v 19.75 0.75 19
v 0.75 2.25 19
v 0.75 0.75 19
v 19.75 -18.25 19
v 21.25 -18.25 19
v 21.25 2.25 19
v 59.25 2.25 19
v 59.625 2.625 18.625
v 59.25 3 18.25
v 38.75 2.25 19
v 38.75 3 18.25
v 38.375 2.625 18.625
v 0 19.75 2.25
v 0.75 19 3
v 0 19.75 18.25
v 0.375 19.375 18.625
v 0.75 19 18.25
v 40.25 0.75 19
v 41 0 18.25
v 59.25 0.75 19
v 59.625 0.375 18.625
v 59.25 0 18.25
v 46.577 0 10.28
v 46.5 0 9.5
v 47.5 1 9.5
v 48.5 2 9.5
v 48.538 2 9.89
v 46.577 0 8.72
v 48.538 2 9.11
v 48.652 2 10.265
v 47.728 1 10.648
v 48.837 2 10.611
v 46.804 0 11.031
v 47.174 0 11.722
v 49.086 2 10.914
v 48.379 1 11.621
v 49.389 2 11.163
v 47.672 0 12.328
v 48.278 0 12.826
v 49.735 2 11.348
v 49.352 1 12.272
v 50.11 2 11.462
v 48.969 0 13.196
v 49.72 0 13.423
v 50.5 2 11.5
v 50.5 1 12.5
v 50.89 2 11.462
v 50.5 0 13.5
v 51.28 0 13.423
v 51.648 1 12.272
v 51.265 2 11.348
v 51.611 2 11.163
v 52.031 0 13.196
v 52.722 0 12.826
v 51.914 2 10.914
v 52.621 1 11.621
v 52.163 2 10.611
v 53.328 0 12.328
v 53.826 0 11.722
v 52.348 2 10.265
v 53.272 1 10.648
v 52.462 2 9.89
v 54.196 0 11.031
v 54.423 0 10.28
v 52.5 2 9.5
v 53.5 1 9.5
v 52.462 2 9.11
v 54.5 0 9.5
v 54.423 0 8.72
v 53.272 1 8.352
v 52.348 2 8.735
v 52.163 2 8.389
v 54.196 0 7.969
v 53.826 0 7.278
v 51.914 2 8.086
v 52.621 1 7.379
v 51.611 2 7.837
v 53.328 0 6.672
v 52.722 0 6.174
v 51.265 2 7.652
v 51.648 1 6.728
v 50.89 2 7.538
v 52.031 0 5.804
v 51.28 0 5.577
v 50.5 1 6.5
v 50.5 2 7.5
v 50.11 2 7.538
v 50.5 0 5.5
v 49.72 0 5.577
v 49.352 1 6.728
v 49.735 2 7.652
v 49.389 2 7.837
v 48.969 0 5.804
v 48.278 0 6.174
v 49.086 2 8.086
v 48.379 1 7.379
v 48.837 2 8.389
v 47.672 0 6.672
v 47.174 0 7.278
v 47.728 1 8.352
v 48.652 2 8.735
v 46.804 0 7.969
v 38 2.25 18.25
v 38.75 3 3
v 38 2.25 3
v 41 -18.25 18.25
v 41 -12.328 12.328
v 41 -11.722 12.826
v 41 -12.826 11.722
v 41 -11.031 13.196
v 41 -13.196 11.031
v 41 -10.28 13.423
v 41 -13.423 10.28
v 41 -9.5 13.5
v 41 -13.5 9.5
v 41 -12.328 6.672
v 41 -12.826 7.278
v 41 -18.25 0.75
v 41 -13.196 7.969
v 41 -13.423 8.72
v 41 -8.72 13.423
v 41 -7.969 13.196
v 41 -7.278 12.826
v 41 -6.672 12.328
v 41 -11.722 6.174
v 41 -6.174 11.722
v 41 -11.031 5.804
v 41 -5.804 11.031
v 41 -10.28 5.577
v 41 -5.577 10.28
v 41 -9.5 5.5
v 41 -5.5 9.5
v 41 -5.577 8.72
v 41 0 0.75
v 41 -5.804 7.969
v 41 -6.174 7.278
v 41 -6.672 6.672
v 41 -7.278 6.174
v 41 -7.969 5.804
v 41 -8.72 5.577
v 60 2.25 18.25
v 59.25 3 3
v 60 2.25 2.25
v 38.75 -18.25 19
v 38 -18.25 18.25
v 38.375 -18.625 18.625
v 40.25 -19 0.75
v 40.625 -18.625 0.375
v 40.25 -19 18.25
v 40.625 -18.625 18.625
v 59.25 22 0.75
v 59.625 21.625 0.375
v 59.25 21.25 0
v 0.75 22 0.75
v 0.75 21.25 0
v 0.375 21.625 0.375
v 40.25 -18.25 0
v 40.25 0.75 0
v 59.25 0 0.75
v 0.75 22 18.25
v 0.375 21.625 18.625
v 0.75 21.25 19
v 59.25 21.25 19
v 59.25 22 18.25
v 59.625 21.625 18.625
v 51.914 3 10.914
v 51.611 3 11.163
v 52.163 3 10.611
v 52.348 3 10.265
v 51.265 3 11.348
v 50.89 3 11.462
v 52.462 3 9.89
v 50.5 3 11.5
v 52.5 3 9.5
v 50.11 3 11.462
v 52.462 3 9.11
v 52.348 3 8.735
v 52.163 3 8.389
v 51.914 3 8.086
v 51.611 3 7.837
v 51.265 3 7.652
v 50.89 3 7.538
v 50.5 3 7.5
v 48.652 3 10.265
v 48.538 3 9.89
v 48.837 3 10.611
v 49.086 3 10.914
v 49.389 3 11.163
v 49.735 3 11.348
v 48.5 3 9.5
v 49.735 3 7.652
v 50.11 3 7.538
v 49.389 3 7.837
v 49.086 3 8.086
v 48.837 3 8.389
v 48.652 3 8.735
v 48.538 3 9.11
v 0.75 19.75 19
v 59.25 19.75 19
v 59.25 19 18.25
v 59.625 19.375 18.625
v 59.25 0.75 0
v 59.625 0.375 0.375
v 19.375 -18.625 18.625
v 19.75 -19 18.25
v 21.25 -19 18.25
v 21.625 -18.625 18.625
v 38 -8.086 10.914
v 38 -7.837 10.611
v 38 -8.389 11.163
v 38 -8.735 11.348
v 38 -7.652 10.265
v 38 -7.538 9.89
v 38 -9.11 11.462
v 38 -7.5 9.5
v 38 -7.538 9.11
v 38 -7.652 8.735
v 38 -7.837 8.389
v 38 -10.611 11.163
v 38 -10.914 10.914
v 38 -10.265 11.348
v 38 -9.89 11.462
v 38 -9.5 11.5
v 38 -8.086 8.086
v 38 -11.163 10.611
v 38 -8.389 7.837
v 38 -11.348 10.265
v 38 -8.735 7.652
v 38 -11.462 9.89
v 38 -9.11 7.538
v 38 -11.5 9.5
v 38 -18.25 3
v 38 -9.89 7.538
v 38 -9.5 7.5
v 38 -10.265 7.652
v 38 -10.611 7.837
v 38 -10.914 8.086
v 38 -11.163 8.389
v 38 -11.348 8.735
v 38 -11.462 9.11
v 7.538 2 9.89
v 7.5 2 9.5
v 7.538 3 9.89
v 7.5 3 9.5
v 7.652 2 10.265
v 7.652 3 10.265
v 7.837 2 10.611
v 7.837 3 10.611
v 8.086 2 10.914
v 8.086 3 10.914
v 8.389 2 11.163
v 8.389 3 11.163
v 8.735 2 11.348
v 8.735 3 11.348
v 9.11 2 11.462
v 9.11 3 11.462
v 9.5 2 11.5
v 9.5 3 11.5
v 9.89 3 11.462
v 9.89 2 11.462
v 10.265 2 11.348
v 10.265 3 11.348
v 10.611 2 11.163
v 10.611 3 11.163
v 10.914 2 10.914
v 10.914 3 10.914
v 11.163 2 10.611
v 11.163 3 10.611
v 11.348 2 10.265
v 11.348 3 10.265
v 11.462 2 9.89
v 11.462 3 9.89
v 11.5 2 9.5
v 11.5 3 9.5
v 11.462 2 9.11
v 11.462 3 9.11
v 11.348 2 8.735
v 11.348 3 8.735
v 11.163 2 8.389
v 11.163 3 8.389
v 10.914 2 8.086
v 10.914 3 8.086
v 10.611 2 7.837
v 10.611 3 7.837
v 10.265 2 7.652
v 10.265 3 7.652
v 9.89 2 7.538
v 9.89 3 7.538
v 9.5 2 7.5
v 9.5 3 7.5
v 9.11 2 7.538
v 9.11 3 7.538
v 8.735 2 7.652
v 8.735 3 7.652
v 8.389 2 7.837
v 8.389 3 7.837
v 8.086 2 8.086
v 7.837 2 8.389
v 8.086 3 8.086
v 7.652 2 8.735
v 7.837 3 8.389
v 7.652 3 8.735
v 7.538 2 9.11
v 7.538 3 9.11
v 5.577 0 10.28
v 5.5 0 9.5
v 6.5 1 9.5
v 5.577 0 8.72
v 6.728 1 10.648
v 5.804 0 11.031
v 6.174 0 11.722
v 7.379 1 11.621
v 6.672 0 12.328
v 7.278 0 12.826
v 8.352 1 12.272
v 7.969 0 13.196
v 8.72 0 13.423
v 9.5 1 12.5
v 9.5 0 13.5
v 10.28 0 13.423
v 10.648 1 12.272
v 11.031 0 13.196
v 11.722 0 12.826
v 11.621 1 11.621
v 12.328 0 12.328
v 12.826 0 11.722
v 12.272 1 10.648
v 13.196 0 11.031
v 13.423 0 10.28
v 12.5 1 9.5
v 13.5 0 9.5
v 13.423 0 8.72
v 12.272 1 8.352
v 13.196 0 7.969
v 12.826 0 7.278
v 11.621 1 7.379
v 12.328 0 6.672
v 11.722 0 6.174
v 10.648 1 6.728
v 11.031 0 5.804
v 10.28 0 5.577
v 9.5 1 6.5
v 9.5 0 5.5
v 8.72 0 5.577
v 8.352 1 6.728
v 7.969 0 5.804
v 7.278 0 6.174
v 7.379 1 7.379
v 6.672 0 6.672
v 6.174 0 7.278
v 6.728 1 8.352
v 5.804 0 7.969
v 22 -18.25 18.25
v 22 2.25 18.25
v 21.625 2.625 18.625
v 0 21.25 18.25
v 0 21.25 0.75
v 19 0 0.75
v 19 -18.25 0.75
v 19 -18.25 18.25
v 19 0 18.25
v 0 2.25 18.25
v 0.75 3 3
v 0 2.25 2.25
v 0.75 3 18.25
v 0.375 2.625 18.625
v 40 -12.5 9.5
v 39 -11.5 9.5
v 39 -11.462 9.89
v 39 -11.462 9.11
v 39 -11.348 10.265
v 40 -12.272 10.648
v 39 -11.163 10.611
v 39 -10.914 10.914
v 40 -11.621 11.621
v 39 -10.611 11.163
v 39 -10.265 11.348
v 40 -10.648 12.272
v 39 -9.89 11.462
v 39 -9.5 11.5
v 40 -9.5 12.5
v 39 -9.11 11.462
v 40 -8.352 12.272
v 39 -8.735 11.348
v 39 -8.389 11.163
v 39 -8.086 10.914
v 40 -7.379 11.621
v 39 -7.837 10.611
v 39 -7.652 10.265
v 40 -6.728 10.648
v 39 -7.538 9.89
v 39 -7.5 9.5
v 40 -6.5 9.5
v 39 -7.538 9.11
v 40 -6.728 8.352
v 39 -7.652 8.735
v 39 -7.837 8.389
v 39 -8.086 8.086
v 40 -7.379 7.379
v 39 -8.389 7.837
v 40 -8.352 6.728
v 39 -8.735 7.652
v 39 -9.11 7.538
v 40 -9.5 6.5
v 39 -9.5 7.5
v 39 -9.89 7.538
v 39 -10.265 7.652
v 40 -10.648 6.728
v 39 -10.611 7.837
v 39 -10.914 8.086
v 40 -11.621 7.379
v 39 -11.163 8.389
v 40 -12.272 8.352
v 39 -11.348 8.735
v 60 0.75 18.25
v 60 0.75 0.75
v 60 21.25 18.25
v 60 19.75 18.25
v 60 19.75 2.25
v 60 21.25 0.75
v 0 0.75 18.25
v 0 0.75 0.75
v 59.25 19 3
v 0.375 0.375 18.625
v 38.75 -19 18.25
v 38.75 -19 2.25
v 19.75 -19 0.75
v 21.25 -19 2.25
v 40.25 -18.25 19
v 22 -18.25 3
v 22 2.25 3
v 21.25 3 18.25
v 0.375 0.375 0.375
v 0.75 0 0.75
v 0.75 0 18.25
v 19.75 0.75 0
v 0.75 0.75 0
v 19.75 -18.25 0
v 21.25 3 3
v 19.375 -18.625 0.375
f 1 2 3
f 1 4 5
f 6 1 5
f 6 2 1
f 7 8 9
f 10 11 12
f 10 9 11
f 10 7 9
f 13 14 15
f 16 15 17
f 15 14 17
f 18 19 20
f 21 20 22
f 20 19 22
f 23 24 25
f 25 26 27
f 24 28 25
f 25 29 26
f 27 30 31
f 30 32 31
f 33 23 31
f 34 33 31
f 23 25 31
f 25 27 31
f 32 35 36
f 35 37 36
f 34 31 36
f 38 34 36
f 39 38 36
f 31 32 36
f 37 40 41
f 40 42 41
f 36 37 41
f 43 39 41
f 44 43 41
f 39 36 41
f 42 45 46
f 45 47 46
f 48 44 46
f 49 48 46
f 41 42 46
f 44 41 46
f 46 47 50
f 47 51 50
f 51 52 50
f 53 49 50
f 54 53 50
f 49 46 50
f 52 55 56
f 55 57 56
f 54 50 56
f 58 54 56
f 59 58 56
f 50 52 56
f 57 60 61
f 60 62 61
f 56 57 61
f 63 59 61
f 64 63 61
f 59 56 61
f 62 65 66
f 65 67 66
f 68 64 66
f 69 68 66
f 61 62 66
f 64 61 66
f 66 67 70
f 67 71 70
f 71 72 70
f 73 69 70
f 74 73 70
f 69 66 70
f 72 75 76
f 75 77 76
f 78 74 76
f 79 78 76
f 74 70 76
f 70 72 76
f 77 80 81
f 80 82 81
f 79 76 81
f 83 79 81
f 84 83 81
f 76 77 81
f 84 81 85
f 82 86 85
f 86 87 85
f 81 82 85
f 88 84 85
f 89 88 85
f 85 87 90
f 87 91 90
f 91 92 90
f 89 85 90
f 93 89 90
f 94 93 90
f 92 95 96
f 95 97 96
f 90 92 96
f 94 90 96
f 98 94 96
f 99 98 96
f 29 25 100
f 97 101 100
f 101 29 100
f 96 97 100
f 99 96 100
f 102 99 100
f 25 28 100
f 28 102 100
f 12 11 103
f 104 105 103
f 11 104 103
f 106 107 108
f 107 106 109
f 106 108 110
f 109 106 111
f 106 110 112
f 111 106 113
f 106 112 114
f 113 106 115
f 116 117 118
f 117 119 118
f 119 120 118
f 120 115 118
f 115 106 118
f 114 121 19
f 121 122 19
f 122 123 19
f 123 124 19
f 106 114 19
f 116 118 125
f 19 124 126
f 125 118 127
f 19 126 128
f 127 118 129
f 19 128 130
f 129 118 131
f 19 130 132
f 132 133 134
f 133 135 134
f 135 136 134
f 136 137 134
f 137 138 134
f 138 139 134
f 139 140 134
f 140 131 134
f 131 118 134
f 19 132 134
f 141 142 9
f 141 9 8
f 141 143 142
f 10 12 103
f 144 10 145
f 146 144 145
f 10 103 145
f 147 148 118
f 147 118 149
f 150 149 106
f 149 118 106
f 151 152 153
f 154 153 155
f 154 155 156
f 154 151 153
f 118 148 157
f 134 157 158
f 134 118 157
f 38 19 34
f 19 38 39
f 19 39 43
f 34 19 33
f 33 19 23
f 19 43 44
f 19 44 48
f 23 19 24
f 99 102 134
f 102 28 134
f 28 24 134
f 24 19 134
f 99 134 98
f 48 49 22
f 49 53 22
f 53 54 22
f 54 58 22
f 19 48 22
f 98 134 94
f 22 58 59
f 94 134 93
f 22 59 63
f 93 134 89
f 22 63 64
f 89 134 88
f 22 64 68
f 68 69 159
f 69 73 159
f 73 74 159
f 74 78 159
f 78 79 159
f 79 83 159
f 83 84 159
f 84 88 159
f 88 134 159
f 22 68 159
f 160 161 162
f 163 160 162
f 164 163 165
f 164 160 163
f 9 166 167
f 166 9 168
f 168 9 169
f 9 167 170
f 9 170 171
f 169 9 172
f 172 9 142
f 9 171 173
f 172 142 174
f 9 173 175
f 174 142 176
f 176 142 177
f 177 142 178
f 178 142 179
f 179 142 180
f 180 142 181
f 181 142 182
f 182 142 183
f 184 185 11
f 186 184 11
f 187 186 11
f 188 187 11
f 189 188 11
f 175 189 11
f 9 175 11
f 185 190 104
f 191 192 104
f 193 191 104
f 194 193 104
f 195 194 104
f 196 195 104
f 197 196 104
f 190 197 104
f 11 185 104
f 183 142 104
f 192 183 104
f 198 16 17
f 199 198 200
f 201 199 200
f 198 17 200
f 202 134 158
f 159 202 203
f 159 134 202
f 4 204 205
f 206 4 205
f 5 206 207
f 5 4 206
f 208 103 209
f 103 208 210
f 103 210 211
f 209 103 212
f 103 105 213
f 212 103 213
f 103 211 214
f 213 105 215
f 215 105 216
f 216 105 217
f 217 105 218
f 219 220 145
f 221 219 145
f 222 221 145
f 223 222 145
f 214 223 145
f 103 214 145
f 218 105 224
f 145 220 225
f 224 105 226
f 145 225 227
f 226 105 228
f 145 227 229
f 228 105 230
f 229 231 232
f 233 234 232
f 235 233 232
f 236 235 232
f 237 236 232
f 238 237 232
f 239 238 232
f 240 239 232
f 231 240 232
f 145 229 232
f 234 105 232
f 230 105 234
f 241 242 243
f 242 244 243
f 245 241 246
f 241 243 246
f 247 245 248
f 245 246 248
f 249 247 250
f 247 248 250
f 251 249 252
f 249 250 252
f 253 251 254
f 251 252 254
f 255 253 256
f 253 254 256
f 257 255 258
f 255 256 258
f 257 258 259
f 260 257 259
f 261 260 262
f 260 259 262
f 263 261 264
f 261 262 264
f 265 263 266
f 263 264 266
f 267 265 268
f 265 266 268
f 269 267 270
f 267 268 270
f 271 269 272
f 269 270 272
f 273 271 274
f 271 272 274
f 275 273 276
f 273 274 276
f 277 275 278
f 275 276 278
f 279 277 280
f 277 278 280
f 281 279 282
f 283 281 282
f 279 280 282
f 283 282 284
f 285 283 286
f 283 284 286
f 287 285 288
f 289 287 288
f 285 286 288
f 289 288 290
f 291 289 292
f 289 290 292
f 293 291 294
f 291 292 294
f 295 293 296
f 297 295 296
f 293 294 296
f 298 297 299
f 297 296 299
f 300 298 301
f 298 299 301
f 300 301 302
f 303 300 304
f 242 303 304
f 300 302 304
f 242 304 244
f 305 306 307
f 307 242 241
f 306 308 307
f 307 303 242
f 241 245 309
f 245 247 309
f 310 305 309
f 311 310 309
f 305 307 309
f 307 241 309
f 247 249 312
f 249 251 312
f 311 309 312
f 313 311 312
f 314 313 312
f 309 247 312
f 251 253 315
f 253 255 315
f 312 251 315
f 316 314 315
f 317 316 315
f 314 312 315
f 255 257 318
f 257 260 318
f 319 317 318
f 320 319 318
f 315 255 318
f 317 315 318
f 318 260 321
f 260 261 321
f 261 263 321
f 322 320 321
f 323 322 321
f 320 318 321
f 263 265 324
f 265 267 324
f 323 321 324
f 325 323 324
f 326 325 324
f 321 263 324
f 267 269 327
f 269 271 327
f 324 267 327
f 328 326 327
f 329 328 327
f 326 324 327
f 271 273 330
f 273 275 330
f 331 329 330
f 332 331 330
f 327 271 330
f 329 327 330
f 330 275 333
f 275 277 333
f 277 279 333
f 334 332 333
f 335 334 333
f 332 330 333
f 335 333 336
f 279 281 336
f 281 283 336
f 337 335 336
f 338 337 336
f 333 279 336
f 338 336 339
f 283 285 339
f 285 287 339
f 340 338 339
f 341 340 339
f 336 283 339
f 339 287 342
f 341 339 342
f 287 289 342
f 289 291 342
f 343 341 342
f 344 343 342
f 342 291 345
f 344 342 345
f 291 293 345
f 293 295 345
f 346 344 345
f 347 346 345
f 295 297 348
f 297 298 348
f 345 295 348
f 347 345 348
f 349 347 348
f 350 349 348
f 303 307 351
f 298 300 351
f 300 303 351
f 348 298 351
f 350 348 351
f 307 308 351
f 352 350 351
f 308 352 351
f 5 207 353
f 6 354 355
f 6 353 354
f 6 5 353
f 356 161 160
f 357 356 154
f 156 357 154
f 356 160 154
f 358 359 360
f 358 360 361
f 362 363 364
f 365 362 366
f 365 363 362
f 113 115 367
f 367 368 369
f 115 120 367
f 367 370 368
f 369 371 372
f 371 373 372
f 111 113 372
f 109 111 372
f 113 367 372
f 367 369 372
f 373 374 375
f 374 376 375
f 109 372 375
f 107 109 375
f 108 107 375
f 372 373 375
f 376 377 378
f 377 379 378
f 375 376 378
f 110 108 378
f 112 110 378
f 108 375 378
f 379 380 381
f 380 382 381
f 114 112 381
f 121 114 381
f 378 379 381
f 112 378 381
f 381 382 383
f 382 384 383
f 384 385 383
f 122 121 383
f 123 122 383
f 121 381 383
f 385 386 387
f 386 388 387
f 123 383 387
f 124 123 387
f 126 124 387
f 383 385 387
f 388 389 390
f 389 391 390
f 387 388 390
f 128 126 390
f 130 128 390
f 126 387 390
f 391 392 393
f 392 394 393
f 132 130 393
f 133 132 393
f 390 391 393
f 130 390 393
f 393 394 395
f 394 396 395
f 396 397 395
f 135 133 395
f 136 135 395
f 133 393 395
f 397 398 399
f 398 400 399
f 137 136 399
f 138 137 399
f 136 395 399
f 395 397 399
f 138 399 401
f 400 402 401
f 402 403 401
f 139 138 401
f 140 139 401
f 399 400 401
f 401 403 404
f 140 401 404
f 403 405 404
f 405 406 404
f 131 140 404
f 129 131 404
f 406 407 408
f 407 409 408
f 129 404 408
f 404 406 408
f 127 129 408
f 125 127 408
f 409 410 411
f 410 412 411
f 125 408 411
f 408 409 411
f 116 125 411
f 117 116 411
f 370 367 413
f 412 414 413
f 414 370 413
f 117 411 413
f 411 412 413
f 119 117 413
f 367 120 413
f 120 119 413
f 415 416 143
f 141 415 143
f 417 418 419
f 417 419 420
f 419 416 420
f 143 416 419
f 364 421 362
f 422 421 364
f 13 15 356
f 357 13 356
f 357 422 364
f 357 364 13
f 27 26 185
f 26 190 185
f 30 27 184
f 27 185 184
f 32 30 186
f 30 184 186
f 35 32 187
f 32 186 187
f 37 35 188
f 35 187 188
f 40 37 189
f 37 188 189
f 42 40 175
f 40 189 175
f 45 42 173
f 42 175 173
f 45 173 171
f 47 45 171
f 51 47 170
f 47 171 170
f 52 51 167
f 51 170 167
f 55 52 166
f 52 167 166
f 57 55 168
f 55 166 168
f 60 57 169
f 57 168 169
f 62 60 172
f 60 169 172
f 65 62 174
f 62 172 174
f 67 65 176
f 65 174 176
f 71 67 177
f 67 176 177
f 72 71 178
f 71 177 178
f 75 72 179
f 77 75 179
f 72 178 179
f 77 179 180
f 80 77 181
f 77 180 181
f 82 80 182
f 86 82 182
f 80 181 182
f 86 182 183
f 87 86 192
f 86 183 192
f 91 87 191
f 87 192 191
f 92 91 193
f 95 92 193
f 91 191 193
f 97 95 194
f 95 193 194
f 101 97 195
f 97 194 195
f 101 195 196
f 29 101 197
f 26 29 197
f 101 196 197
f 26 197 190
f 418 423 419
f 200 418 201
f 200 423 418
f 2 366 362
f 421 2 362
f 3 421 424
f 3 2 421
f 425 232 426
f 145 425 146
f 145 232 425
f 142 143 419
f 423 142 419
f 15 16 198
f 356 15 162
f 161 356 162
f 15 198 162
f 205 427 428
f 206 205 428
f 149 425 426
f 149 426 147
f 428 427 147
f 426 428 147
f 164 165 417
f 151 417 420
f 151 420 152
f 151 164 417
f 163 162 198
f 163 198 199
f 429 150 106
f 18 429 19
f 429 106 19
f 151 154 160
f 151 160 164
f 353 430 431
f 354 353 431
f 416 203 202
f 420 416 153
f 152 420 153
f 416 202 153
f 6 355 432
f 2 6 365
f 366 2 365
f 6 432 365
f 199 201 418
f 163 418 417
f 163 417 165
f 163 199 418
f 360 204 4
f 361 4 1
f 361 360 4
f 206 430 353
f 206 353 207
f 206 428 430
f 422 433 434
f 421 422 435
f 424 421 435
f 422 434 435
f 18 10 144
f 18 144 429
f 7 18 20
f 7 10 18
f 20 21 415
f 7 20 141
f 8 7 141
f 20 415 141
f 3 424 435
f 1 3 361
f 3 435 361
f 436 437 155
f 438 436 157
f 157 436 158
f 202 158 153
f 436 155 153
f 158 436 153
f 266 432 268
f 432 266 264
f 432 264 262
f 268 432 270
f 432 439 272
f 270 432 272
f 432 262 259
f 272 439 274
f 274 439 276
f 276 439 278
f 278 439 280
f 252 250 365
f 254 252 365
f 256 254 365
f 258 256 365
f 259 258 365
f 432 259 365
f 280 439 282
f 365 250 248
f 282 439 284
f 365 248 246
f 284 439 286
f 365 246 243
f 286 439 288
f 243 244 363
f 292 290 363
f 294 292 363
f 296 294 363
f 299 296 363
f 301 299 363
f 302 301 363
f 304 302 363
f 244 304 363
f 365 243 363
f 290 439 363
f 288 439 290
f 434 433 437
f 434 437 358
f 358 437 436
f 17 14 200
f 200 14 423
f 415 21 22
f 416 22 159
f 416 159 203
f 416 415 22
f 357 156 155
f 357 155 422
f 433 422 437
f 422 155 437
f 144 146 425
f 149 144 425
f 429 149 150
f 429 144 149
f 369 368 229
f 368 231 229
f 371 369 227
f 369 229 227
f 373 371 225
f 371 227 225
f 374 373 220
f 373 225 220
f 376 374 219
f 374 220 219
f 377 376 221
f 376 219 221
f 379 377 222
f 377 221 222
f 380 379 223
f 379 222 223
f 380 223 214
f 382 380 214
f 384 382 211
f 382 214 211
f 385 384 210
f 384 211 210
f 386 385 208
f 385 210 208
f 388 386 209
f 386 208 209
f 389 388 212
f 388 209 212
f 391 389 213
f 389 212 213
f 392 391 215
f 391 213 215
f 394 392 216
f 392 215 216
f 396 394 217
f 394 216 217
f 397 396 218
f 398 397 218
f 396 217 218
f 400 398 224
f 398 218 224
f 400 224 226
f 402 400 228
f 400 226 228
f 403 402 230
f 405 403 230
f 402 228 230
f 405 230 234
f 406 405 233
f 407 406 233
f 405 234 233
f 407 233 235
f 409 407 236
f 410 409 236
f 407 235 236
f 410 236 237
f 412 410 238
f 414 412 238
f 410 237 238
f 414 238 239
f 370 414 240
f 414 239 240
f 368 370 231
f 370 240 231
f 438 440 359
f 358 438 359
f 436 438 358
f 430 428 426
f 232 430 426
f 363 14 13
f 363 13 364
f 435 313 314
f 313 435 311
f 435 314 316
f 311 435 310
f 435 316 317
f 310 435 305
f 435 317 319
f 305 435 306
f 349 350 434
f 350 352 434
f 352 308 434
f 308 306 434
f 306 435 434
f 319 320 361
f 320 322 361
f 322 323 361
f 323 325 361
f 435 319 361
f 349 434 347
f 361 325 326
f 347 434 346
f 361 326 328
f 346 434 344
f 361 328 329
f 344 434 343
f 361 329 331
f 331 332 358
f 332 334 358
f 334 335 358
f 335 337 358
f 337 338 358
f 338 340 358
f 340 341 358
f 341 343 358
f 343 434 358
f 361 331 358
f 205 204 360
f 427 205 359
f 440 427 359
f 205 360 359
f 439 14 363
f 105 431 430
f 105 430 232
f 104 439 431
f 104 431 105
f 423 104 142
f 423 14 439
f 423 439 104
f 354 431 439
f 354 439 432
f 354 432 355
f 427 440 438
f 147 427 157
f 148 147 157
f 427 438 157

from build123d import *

# Parameters (mm, degrees)
F0_W           = 22
F0_H           = 19
F1_DEPTH       = 3
F2_W           = 60
F2_H           = 3
F2_W_2         = 3
F2_H_2         = 19
F3_DEPTH       = 16
F5_D           = 4
F5_DEPTH       = 12
F5_CSINK_D     = 8
F5_CSINK_ANGLE = 90
F5_TIP         = 1.2017212381
F7_D           = 4
F7_DEPTH       = 12
F7_CSINK_D     = 8
F7_CSINK_ANGLE = 90
F7_TIP         = 1.2017212381
F9_D           = 4
F9_DEPTH       = 12
F9_CSINK_D     = 8
F9_CSINK_ANGLE = 90
F9_TIP         = 1.2017212381
F10_SIZE       = 0.75
F11_SIZE       = 0.75
F12_SIZE       = 0.75
F13_SIZE       = 0.75


with BuildPart() as f1:
    # F0 (on Top) → F1 (new body)
    with BuildSketch(Plane.XY):
        Polygon((0, 22), (0, 0), (19, 0), (41, 0), (60, 0), (60, 22), align=None)
        with Locations((30, -9.5)):
            Rectangle(F0_W, F0_H)
    extrude(amount=F1_DEPTH)

    # F2 (on face) → F3 (join)
    with BuildSketch(Plane.XY.offset(3)):
        with Locations((30, 20.5)):
            Rectangle(F2_W, F2_H)
        Polygon((0, 0), (19, 0), (22, 0), (22, 3), (0, 3), align=None)
        with Locations((20.5, -9.5)):
            Rectangle(F2_W_2, F2_H_2)
        with Locations((39.5, -9.5)):
            Rectangle(F2_W_2, F2_H_2)
        Polygon((38, 0), (41, 0), (60, 0), (60, 3), (38, 3), align=None)
    extrude(amount=F3_DEPTH)

    # F5
    with Locations(Plane.XZ):
        with Locations((50.5, 9.5)):
            CounterSinkHole(F5_D / 2, F5_CSINK_D / 2, depth=F5_DEPTH, counter_sink_angle=F5_CSINK_ANGLE)
            with Locations((0, 0, -(F5_DEPTH + F5_TIP / 2))):  # 118° drill point
                Cone(0, F5_D / 2, F5_TIP, mode=Mode.SUBTRACT)

    # F7
    with Locations(Plane.YZ.offset(41)):
        with Locations((-9.5, 9.5)):
            CounterSinkHole(F7_D / 2, F7_CSINK_D / 2, depth=F7_DEPTH, counter_sink_angle=F7_CSINK_ANGLE)
            with Locations((0, 0, -(F7_DEPTH + F7_TIP / 2))):  # 118° drill point
                Cone(0, F7_D / 2, F7_TIP, mode=Mode.SUBTRACT)

    # F9
    with Locations(Plane.XZ):
        with Locations((9.5, 9.5)):
            CounterSinkHole(F9_D / 2, F9_CSINK_D / 2, depth=F9_DEPTH, counter_sink_angle=F9_CSINK_ANGLE)
            with Locations((0, 0, -(F9_DEPTH + F9_TIP / 2))):  # 118° drill point
                Cone(0, F9_D / 2, F9_TIP, mode=Mode.SUBTRACT)

    # F10
    f10_edges = [f1.edges().sort_by_distance(p)[0] for p in [
        (60, 0, 9.5),
        (60, 1.5, 19),
        (60, 3, 11),
        (60, 11, 3),
        (60, 19, 11),
        (60, 20.5, 19),
        (60, 22, 9.5),
        (60, 11, 0),
        (19, -19, 9.5),
        (20.5, -19, 19),
        (22, -19, 11),
        (30, -19, 3),
        (38, -19, 11),
        (39.5, -19, 19),
        (41, -19, 9.5),
        (30, -19, 0),
        (0, 22, 9.5),
        (0, 20.5, 19),
        (0, 19, 11),
        (0, 11, 3),
        (0, 3, 11),
        (0, 1.5, 19),
        (0, 0, 9.5),
        (0, 11, 0),
    ]]
    chamfer(f10_edges, length=F10_SIZE)

    # F11
    f11_edges = [f1.edges().sort_by_distance(p)[0] for p in [
        (38, 3, 11),
        (22, 3, 11),
    ]]
    chamfer(f11_edges, length=F11_SIZE)

    # F12 (call 1 of 8: OpenCascade refuses the feature's edges together)
    f12_edges = [f1.edges().sort_by_distance(p)[0] for p in [
        (30, 22, 19),
    ]]
    chamfer(f12_edges, length=F12_SIZE)

    # F12#2 (call 2 of 8)
    f12_2_edges = [f1.edges().sort_by_distance(p)[0] for p in [
        (30, 19, 19),
    ]]
    chamfer(f12_2_edges, length=F12_SIZE)

    # F12#3 (call 3 of 8)
    f12_3_edges = [f1.edges().sort_by_distance(p)[0] for p in [
        (49, 3, 19),
    ]]
    chamfer(f12_3_edges, length=F12_SIZE)

    # F12#4 (call 4 of 8)
    f12_4_edges = [f1.edges().sort_by_distance(p)[0] for p in [
        (50.125, 0, 19),
        (41, -9.125, 19),
    ]]
    chamfer(f12_4_edges, length=F12_SIZE)

    # F12#5 (call 5 of 8)
    f12_5_edges = [f1.edges().sort_by_distance(p)[0] for p in [
        (38, -8, 19),
    ]]
    chamfer(f12_5_edges, length=F12_SIZE)

    # F12#6 (call 6 of 8)
    f12_6_edges = [f1.edges().sort_by_distance(p)[0] for p in [
        (22, -8, 19),
    ]]
    chamfer(f12_6_edges, length=F12_SIZE)

    # F12#7 (call 7 of 8)
    f12_7_edges = [f1.edges().sort_by_distance(p)[0] for p in [
        (19, -9.125, 19),
        (9.875, 0, 19),
    ]]
    chamfer(f12_7_edges, length=F12_SIZE)

    # F12#8 (call 8 of 8)
    f12_8_edges = [f1.edges().sort_by_distance(p)[0] for p in [
        (11, 3, 19),
    ]]
    chamfer(f12_8_edges, length=F12_SIZE)

    # F13
    f13_edges = [f1.edges().sort_by_distance(p)[0] for p in [
        (9.875, 0, 0),
        (19, -9.125, 0),
        (41, -9.125, 0),
        (50.125, 0, 0),
        (30, 22, 0),
    ]]
    chamfer(f13_edges, length=F13_SIZE)


solid = f1.part
